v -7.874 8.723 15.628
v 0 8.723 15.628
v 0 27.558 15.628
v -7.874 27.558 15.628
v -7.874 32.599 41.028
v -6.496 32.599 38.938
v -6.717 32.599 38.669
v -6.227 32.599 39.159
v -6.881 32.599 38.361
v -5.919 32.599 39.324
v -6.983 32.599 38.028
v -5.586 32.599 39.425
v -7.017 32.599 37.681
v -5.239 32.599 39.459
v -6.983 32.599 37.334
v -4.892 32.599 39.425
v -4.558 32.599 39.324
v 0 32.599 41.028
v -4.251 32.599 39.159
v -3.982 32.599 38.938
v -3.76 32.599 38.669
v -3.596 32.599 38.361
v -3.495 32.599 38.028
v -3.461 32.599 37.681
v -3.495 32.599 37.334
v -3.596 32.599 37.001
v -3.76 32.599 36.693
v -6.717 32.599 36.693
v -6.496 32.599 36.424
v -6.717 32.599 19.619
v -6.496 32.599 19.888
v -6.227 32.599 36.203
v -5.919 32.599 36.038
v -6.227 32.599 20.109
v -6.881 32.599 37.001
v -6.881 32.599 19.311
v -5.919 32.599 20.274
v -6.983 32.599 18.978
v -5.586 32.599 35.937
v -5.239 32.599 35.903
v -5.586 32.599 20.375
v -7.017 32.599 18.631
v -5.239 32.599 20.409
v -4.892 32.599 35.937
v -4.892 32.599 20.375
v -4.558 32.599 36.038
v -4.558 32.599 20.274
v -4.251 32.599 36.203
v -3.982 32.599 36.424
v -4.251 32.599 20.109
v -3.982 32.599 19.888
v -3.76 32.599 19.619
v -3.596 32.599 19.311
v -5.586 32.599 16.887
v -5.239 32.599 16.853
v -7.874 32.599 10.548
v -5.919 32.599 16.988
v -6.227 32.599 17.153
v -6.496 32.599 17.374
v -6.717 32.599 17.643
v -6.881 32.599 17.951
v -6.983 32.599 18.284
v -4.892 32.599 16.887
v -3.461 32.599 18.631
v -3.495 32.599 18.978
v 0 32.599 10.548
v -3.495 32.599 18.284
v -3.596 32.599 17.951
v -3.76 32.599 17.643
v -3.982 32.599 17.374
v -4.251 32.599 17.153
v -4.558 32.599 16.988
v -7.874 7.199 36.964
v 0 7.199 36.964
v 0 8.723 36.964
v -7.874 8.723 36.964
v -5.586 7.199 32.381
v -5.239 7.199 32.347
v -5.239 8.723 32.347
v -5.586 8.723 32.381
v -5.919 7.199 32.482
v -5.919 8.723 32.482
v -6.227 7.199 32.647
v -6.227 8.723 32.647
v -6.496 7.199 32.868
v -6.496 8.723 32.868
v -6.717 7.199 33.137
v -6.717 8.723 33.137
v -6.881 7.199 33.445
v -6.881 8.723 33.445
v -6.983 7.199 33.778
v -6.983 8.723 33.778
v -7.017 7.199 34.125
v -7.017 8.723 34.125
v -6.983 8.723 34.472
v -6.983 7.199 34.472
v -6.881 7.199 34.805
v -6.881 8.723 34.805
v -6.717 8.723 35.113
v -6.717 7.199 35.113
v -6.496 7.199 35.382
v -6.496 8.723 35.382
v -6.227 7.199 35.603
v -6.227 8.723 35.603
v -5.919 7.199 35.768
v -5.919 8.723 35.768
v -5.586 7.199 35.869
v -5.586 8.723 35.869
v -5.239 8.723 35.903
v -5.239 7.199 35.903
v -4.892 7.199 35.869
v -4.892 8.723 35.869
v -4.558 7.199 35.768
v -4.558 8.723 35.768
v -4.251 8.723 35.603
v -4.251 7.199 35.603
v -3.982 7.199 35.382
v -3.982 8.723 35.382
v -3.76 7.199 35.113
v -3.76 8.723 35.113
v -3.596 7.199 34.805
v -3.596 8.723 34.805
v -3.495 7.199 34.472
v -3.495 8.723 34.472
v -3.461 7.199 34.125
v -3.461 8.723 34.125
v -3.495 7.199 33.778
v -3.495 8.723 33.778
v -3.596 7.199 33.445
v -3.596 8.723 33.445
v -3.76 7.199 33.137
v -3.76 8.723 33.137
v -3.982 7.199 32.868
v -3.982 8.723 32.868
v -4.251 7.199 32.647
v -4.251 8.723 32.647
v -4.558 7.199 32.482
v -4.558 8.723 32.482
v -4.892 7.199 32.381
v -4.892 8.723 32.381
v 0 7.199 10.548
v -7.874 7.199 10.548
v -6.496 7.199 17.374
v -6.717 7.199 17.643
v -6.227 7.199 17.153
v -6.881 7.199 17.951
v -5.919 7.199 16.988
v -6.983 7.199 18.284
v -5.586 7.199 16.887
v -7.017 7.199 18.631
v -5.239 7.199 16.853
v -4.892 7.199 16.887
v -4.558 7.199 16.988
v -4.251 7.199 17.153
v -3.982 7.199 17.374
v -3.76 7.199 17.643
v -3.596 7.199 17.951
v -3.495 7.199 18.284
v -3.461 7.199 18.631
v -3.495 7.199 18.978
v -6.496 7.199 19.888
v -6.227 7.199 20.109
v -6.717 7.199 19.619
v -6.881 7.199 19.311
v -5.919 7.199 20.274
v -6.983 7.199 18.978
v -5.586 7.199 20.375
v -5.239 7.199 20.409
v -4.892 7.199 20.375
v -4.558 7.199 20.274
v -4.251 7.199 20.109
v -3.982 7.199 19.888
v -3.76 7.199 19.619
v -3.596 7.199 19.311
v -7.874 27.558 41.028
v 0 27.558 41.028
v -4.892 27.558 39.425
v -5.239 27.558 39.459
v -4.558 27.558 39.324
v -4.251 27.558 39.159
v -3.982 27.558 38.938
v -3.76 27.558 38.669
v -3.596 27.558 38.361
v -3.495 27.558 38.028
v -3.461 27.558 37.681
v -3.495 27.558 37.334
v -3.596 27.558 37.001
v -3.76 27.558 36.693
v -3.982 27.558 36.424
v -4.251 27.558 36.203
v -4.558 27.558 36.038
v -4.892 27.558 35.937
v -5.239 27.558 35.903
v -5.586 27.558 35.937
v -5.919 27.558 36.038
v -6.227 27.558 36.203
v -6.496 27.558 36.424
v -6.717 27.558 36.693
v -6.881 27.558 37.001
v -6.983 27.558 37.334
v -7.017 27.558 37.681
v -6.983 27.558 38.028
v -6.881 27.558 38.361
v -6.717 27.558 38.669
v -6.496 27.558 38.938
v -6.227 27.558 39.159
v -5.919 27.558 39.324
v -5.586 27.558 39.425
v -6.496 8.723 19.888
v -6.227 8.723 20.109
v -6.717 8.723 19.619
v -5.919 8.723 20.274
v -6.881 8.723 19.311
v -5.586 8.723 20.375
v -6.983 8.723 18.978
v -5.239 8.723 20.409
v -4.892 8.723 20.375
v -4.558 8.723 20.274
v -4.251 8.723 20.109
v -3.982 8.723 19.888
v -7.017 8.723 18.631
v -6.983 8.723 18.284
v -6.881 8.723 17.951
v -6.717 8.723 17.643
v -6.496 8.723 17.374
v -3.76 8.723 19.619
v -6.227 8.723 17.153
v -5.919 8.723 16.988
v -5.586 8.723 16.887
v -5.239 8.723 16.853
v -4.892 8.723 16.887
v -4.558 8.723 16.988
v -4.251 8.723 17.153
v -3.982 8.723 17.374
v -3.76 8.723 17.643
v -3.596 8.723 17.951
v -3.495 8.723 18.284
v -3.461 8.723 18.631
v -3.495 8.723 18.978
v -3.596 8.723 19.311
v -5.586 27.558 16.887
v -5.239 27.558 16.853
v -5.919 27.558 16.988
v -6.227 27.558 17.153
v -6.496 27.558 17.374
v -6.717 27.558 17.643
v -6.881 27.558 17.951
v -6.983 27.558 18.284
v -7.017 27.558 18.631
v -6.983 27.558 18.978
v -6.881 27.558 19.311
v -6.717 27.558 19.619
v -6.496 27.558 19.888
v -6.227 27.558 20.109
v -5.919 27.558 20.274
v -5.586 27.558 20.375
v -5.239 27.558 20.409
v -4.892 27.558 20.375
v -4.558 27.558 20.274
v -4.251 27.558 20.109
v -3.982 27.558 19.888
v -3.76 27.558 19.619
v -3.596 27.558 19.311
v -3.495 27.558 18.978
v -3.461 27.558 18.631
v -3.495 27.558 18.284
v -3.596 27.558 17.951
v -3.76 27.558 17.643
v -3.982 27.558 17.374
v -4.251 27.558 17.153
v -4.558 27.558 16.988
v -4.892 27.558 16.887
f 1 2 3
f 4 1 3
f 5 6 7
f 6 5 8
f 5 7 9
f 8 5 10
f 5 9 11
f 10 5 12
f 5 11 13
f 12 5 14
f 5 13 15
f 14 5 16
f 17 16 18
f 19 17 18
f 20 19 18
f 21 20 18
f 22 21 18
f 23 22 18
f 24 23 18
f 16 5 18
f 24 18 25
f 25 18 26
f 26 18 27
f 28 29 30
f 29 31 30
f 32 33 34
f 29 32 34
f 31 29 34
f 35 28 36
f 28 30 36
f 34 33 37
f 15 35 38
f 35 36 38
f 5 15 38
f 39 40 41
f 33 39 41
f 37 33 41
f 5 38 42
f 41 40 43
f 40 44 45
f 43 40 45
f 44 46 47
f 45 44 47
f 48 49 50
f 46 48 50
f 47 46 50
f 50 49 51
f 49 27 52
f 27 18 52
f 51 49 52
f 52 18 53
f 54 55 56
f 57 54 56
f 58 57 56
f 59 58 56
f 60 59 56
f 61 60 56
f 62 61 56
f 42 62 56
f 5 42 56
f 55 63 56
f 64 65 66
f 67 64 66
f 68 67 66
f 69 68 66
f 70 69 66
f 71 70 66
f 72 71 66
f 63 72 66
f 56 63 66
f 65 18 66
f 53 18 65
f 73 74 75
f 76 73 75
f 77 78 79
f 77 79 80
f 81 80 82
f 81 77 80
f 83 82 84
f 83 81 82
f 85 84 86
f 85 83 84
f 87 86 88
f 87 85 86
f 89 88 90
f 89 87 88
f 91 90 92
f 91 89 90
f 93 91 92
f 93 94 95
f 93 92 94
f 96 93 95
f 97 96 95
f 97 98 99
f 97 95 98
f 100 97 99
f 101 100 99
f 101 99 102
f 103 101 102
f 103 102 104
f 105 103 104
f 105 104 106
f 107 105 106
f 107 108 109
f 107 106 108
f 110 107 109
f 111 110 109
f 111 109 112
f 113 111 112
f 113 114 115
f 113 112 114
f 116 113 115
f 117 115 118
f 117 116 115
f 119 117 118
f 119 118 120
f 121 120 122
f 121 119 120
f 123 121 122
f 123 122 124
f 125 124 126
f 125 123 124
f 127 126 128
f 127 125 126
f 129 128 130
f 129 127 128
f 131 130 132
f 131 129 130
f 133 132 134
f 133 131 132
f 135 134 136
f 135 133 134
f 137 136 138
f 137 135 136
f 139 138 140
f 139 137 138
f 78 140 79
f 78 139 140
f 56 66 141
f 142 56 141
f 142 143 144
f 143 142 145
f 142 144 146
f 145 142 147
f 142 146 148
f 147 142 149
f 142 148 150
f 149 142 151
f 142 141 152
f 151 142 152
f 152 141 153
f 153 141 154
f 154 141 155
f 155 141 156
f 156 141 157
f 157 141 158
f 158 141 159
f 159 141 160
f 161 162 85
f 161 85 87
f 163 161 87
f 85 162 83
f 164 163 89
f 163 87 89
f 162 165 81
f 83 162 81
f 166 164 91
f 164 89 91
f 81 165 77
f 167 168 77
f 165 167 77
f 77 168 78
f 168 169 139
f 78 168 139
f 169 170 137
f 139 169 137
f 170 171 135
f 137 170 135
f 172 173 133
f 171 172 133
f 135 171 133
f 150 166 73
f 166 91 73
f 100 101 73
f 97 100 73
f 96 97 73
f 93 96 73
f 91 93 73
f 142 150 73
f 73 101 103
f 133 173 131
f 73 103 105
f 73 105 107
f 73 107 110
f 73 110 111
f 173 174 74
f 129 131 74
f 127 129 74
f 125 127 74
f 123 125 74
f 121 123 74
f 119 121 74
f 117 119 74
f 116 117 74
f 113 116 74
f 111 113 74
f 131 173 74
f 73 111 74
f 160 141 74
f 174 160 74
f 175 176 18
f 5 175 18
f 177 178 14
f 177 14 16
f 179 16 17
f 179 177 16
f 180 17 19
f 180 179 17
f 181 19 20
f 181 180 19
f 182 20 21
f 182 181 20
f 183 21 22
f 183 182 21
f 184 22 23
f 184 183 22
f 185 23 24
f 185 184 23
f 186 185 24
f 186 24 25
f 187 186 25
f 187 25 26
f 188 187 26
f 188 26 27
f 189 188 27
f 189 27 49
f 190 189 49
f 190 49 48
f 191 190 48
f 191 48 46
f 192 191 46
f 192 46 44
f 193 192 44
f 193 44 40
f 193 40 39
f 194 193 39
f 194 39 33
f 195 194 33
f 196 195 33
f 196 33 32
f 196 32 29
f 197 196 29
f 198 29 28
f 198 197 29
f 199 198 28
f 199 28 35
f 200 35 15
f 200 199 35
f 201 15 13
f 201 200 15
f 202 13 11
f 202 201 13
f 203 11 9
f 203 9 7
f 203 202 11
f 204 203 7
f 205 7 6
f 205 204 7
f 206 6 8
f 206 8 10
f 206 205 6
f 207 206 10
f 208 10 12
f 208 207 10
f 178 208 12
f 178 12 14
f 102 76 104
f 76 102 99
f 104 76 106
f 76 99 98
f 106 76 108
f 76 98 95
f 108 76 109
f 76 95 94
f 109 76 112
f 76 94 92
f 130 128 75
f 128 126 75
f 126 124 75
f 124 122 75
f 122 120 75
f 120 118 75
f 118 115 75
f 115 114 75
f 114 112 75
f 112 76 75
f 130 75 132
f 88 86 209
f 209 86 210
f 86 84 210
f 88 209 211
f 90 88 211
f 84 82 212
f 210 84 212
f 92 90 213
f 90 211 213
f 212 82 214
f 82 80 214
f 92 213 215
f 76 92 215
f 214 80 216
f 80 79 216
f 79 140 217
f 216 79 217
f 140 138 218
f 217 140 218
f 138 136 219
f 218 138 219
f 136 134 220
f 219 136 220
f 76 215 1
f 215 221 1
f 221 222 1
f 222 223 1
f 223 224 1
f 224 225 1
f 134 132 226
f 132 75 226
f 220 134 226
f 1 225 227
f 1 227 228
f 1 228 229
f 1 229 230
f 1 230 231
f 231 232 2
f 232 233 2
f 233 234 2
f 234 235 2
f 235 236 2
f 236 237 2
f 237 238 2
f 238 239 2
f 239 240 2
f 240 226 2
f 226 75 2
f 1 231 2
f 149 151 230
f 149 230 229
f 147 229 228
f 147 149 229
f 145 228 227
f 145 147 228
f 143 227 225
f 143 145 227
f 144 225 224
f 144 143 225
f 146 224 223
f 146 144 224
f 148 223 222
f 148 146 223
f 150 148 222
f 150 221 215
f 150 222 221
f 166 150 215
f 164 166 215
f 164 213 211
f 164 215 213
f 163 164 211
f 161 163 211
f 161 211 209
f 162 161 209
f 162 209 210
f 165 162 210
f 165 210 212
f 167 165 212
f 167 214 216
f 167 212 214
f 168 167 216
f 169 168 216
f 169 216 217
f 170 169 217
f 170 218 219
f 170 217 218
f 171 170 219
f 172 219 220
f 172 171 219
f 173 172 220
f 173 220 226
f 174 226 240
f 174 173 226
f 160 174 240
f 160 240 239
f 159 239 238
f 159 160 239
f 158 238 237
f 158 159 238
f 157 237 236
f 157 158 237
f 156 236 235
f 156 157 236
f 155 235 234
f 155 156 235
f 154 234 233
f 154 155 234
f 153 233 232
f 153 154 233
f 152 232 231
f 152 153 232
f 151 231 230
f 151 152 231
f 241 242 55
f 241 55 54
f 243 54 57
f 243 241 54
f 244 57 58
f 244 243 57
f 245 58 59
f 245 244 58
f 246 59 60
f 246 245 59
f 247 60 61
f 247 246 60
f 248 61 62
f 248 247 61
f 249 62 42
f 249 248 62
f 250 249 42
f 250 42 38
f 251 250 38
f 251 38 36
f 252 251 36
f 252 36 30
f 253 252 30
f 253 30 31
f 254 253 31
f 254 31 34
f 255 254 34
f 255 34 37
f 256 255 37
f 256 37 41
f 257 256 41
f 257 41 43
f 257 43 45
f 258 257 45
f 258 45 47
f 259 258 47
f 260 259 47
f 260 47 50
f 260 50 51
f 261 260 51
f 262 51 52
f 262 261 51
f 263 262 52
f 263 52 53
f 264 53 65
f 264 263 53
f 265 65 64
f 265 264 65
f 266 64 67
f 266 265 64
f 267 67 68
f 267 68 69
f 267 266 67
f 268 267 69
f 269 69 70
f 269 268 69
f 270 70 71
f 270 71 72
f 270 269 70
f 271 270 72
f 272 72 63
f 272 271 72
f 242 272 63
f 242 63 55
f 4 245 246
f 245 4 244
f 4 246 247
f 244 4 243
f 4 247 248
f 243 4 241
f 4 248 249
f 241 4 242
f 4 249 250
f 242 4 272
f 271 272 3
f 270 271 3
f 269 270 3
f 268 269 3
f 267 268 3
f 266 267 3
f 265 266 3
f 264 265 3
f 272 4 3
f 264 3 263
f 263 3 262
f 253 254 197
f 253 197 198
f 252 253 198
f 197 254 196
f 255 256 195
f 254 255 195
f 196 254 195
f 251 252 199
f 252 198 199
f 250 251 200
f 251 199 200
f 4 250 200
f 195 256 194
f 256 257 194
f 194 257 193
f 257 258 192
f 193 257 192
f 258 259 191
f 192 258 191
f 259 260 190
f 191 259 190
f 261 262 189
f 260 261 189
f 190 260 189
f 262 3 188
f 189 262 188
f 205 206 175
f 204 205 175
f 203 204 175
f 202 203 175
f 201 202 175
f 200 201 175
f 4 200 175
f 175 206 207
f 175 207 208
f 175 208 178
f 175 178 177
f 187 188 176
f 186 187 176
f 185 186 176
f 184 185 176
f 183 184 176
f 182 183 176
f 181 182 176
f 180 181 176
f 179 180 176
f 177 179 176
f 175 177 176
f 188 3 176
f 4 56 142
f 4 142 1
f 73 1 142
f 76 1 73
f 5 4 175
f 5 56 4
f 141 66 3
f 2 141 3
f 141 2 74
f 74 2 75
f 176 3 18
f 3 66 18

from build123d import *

# Parameters (mm, degrees)
BOSS_EXTRUDE1_DEPTH = 7.874
SKETCH4_R           = 1.778
CUT_EXTRUDE2_DEPTH  = 20.828
CUT_EXTRUDE3_START  = -6.35
SKETCH5_R           = 1.778
CUT_EXTRUDE3_DEPTH  = 6.35


with BuildPart() as part:
    # Sketch1 → Boss-Extrude1 (new body)
    with BuildSketch(Plane(origin=(0, 0, 0), x_dir=(0, 0, -1), z_dir=(1, 0, 0))):
        Polygon((-10.547521943, 32.599346848), (-10.547521943, 7.199346848), (-36.963521943, 7.199346848), (-36.963521943, 8.723346848), (-15.627521943, 8.723346848), (-15.627521943, 27.558210738), (-41.027521943, 27.558210738), (-41.027521943, 32.599346848), align=None)
    extrude(amount=-BOSS_EXTRUDE1_DEPTH)

    # Sketch4 → Cut-Extrude2 (cut)
    with BuildSketch(Plane(origin=(0, 0, 0), x_dir=(1, 0, 0), z_dir=(0, 1, 0))):
        with Locations(Location((-5.23875, -18.631071943, 0), (0, 0, 90))):
            Circle(SKETCH4_R)
        with Locations(Location((-5.23875, -34.125071943, 0), (0, 0, 90))):
            Circle(SKETCH4_R)
    extrude(amount=CUT_EXTRUDE2_DEPTH, mode=Mode.SUBTRACT)

    # Sketch5 → Cut-Extrude3 (cut)
    with BuildSketch(Plane(origin=(0, 32.599346848, 0), x_dir=(1, 0, 0), z_dir=(0, 1, 0)).offset(CUT_EXTRUDE3_START)):
        with Locations(Location((-5.23875, -18.631071943, 0), (0, 0, 90))):
            Circle(SKETCH5_R)
        with Locations(Location((-5.23875, -37.681071943, 0), (0, 0, 270))):
            Circle(SKETCH5_R)
    extrude(amount=CUT_EXTRUDE3_DEPTH, mode=Mode.SUBTRACT)


solid = part.part
